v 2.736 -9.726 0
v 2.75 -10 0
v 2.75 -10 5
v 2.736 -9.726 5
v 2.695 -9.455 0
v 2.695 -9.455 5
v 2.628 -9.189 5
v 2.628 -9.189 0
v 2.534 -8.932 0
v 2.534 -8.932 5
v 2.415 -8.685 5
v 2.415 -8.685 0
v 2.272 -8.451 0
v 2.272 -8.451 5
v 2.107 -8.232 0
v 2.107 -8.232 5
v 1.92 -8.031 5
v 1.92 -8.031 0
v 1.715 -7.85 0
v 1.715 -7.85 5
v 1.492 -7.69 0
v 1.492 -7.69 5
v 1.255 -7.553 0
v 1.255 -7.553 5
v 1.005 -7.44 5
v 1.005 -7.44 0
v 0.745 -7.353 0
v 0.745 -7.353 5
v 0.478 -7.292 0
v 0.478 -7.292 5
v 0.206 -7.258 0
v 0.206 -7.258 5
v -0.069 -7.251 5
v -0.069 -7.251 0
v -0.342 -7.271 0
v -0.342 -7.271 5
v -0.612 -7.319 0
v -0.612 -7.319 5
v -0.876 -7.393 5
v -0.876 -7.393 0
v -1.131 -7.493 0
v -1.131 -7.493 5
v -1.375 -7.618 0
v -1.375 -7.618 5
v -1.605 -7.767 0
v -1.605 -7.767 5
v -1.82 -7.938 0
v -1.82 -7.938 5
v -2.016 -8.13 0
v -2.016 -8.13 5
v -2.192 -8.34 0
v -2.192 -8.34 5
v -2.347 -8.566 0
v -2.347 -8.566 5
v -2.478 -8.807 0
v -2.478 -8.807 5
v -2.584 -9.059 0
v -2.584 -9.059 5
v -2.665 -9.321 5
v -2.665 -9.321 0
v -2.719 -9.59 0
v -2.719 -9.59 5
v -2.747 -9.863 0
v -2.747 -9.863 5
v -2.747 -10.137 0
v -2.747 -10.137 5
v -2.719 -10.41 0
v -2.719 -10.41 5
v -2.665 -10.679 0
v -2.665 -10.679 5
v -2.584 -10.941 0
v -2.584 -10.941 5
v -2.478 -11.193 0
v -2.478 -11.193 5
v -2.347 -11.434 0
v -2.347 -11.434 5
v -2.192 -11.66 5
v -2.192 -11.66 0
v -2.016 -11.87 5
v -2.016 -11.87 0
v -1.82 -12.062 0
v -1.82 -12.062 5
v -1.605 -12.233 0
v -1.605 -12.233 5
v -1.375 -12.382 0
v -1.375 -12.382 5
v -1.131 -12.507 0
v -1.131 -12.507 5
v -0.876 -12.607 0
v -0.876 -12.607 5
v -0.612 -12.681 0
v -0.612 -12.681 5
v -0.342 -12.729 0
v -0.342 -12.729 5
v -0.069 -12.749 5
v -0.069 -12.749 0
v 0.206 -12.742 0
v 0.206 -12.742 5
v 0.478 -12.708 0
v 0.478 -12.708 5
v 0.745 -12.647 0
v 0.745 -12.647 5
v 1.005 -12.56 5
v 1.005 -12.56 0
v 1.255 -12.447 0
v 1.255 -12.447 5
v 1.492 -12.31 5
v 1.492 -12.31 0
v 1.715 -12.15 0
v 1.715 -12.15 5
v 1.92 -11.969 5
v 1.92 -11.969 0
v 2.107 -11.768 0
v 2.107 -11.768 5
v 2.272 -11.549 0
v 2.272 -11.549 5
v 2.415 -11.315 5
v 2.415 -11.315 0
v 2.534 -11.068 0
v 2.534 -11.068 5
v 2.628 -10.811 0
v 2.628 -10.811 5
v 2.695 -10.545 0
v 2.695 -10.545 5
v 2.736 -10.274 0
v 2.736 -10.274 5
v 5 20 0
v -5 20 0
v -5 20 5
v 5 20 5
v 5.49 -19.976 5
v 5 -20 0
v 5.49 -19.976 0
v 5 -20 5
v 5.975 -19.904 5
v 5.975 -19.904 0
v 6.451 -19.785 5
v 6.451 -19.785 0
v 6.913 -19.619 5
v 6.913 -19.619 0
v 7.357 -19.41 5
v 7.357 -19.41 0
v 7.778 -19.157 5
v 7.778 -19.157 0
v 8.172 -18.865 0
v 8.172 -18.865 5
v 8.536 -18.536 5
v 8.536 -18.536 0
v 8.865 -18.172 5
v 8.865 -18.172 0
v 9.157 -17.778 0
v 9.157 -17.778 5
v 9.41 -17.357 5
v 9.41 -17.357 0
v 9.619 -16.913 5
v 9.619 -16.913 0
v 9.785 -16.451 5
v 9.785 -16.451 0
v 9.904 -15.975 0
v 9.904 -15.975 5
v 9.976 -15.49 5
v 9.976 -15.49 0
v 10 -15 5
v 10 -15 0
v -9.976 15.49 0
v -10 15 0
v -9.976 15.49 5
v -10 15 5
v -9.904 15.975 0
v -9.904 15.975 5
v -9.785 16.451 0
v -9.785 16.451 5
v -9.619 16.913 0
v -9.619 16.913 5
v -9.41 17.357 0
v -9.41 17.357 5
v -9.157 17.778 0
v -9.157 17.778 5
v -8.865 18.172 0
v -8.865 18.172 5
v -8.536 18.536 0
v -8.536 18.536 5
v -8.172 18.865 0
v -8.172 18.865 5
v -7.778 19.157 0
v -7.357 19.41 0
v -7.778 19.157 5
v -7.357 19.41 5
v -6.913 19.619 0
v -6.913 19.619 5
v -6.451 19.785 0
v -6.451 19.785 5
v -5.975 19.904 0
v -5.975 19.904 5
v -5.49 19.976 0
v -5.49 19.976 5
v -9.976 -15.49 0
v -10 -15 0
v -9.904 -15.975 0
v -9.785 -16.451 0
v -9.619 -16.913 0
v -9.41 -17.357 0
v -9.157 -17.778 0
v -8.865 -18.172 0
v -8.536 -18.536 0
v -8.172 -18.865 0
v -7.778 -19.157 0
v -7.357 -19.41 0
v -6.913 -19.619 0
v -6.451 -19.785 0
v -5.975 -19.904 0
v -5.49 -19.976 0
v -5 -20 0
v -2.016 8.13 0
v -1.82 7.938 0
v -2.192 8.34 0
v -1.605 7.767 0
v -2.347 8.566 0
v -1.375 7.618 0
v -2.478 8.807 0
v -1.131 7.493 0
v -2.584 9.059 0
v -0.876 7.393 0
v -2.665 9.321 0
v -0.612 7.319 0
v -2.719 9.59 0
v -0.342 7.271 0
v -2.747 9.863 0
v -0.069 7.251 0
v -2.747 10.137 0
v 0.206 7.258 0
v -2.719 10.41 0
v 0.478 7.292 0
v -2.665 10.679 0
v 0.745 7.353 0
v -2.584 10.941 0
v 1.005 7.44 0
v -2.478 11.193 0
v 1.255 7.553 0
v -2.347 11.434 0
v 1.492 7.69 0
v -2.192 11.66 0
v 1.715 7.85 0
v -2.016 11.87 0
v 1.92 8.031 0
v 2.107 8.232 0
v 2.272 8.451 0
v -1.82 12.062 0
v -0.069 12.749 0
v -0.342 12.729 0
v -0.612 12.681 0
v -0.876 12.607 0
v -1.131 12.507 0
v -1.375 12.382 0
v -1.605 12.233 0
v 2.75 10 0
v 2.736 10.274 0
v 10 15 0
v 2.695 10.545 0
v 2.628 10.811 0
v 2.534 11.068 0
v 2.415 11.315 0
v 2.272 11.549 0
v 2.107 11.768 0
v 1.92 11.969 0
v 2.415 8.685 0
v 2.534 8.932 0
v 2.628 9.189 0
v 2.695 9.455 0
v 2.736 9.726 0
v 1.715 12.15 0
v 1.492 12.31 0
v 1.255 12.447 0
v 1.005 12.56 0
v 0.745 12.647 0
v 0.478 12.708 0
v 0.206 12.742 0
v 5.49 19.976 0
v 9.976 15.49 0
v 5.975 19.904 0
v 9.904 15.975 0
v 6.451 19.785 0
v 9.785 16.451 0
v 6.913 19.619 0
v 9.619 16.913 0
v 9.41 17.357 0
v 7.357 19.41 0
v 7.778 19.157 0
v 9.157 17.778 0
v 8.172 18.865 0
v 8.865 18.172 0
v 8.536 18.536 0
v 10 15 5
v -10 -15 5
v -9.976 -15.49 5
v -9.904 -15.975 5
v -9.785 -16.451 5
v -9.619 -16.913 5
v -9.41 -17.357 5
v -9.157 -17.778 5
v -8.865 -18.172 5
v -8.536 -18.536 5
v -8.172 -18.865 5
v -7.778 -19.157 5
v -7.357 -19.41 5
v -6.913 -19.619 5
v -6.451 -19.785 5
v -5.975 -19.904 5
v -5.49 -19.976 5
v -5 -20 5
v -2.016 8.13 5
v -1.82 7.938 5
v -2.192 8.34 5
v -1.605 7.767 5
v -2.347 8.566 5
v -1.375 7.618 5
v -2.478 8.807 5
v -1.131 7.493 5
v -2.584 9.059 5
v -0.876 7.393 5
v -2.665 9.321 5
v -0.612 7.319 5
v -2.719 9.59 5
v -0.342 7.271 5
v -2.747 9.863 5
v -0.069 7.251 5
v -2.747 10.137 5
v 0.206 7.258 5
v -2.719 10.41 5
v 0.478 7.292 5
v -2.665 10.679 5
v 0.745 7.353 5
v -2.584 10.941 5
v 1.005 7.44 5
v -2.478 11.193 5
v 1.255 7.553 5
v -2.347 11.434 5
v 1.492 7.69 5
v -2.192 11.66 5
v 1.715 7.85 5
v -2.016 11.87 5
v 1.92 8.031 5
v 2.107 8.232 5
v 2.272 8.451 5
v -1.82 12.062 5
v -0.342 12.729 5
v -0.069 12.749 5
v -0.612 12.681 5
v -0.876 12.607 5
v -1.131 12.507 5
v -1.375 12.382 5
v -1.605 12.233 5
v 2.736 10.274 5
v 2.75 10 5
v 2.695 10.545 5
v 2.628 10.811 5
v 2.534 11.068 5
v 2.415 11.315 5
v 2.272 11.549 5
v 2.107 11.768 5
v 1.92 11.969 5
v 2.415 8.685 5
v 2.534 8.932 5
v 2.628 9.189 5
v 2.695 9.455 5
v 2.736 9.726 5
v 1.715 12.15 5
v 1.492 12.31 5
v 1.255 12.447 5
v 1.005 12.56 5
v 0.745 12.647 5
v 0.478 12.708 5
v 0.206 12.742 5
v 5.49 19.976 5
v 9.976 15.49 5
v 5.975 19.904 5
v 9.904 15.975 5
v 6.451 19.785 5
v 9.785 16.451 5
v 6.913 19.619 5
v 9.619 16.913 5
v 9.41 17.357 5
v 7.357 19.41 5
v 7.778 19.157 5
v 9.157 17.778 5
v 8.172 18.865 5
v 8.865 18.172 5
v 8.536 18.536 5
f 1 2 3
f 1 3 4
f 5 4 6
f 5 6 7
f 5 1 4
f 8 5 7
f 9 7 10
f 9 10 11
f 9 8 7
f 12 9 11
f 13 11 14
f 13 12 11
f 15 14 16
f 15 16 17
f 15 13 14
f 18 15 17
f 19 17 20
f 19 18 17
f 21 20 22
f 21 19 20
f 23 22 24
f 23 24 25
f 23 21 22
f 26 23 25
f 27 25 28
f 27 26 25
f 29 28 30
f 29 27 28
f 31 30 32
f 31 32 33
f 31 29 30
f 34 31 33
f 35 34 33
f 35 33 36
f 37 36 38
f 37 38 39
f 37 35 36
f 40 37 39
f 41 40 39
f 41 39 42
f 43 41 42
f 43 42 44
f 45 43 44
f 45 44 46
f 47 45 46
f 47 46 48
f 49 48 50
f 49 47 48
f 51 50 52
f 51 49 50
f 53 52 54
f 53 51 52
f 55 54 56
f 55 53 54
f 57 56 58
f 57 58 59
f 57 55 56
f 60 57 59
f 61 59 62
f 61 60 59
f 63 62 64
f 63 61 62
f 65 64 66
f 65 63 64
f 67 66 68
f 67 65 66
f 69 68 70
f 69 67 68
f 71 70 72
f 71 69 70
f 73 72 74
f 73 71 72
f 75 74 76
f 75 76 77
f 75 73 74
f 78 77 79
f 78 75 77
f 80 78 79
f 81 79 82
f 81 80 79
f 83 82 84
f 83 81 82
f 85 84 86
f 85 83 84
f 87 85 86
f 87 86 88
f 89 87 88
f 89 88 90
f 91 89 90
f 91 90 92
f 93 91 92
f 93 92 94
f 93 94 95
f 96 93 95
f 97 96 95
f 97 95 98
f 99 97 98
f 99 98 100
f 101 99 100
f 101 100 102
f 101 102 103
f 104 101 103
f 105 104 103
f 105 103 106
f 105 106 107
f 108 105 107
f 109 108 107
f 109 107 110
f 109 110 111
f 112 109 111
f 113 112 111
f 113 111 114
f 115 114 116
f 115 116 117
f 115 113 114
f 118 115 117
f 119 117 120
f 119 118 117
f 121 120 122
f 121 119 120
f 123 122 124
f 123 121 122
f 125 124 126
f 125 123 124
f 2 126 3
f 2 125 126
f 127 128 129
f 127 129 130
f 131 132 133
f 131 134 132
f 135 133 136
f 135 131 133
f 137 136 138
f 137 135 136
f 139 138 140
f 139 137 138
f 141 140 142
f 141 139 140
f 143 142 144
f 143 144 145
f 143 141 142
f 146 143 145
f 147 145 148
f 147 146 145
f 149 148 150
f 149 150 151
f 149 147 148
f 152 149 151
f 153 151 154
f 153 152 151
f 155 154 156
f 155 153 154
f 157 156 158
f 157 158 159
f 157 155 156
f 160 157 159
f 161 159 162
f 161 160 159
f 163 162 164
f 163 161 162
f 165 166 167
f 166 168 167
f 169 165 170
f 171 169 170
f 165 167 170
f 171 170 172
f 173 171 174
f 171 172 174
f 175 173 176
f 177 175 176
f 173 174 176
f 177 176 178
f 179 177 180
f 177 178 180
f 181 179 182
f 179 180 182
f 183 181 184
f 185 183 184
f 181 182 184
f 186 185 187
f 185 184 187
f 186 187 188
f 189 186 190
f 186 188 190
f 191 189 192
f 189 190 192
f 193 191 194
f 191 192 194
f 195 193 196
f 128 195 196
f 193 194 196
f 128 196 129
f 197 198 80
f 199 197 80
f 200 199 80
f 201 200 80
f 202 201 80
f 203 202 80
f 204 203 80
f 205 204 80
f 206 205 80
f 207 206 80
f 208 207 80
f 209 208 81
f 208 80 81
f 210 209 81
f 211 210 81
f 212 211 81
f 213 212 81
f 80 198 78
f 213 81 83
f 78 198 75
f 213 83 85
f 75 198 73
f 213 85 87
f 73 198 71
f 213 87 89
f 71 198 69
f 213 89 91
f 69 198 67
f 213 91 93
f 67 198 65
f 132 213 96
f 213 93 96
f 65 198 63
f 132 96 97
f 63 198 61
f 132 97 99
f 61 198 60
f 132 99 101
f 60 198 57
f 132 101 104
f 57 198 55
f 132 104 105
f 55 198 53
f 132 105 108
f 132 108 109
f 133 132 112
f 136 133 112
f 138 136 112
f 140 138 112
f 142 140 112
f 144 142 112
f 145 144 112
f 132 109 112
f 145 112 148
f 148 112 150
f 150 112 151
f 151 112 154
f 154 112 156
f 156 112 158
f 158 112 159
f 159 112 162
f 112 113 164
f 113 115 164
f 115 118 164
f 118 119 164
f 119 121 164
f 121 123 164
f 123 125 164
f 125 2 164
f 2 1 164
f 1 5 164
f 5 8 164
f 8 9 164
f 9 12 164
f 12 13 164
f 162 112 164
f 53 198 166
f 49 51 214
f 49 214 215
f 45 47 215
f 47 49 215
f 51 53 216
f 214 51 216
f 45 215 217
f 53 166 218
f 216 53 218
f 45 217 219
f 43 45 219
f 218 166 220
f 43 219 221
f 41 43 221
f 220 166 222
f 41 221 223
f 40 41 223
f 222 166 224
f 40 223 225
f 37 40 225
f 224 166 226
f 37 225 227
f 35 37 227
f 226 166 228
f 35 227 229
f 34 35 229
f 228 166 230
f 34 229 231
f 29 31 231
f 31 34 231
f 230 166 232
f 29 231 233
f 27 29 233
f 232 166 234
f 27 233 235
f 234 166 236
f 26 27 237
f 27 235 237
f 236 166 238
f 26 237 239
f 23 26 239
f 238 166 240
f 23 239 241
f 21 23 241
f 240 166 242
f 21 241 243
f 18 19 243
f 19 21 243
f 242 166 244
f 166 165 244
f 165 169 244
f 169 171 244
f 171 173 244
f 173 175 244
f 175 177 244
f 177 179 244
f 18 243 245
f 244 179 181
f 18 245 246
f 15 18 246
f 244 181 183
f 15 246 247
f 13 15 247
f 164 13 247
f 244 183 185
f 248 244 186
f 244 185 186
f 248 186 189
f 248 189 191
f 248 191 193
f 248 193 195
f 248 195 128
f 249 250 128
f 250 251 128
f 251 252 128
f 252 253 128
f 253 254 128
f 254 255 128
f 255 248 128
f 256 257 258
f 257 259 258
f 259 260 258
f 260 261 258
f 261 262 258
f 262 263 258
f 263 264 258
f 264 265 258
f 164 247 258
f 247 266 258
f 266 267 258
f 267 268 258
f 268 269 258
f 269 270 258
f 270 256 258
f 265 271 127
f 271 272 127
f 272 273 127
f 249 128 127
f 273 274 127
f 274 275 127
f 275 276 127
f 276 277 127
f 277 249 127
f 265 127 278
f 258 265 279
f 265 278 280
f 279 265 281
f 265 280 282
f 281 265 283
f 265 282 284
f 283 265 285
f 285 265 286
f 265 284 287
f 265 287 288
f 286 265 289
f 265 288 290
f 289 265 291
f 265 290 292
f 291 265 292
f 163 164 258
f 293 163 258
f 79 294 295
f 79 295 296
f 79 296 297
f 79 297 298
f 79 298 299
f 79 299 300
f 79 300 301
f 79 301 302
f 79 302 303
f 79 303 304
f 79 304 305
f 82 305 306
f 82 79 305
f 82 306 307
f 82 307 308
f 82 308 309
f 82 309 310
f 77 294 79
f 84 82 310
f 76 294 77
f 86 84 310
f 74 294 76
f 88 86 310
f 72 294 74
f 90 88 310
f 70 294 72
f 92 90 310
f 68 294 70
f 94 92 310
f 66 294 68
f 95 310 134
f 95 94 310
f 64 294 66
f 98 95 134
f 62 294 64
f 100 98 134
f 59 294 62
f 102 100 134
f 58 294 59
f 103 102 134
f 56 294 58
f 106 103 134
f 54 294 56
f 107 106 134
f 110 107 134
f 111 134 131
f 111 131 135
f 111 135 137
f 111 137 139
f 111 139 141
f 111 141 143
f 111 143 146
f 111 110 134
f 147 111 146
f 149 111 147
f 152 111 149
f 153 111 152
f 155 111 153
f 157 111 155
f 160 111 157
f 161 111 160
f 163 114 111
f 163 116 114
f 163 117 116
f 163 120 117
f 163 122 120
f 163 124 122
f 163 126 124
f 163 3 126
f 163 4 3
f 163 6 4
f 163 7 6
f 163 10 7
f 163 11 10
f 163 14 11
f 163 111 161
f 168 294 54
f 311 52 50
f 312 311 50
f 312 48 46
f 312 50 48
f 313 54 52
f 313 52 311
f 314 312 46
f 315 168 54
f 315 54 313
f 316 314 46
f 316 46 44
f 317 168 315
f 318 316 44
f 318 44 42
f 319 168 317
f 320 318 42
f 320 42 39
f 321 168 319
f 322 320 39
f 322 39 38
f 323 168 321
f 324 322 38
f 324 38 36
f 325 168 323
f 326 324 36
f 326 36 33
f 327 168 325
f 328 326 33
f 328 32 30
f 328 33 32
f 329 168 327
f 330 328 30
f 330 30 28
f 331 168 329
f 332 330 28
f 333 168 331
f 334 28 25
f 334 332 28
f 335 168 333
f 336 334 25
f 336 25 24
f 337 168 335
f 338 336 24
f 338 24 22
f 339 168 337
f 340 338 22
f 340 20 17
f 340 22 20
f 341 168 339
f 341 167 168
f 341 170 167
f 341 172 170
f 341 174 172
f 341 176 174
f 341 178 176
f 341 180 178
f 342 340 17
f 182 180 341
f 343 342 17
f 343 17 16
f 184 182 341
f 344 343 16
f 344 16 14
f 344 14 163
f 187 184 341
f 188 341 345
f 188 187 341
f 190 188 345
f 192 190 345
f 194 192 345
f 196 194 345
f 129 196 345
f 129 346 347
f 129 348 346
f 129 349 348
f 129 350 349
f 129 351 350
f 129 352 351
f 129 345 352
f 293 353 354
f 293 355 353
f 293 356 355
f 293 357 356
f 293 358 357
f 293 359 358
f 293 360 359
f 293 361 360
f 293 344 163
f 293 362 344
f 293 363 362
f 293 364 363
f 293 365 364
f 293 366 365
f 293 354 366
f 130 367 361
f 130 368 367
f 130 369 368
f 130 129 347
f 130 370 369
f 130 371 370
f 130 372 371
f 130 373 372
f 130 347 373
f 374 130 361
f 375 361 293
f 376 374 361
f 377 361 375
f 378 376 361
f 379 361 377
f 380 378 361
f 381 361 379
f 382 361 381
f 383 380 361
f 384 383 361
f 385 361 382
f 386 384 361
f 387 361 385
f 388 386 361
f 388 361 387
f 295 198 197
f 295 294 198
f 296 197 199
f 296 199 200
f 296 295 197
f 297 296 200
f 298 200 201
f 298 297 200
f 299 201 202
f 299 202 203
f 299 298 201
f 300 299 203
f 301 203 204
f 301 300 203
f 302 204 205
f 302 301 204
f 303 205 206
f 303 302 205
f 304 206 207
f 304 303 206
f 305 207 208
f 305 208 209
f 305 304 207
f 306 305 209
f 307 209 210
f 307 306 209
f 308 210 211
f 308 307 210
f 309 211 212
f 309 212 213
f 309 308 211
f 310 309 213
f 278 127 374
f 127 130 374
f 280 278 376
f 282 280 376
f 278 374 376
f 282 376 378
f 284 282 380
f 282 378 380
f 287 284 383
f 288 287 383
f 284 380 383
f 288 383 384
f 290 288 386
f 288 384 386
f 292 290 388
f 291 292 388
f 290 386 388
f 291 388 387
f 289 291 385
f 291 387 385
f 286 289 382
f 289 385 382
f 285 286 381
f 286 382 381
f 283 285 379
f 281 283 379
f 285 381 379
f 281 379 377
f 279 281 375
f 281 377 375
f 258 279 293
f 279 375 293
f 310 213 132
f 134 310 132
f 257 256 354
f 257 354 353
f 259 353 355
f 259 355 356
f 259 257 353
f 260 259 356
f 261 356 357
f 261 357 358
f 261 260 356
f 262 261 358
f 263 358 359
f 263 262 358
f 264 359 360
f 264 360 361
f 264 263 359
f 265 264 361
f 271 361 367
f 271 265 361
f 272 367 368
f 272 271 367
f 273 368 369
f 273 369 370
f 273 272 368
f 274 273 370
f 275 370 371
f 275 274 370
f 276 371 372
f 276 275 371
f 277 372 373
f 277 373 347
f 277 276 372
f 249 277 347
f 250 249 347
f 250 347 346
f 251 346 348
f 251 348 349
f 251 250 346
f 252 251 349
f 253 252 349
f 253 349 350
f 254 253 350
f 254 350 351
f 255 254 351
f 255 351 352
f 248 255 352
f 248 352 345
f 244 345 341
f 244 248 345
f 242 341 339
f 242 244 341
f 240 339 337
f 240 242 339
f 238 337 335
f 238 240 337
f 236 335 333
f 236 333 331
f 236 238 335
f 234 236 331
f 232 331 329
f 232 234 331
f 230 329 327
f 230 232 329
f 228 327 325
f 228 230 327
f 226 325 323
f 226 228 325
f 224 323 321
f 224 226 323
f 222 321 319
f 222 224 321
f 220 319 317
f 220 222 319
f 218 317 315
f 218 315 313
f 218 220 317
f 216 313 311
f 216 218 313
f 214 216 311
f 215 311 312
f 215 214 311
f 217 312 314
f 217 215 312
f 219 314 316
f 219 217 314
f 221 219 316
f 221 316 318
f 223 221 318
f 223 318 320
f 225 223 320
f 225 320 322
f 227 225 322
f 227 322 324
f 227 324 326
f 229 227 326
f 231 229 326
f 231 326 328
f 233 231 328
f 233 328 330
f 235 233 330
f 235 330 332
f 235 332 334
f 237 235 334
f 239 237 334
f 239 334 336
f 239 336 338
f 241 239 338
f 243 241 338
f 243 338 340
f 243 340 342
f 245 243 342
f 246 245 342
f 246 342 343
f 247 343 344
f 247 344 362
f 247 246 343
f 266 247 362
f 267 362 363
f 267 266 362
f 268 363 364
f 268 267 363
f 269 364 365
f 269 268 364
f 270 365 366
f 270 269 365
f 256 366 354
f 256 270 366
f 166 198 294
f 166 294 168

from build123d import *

# Parameters (mm, degrees)
F0_W     = 20
F0_H     = 40
F0_R     = 2.75
F1_DEPTH = 5
F2_R     = 5


with BuildPart() as f1:
    # F0 (on Top) → F1 (new body)
    with BuildSketch(Plane.XY):
        Rectangle(F0_W, F0_H)
        with Locations((0, -10)):
            Circle(F0_R, mode=Mode.SUBTRACT)
        with Locations((0, 10)):
            Circle(F0_R, mode=Mode.SUBTRACT)
    extrude(amount=F1_DEPTH)

    # F2
    f2_edges = [f1.edges().sort_by_distance(p)[0] for p in [
        (-10, 20, 2.5),
        (10, 20, 2.5),
        (10, -20, 2.5),
        (-10, -20, 2.5),
    ]]
    fillet(f2_edges, radius=F2_R)


solid = f1.part
